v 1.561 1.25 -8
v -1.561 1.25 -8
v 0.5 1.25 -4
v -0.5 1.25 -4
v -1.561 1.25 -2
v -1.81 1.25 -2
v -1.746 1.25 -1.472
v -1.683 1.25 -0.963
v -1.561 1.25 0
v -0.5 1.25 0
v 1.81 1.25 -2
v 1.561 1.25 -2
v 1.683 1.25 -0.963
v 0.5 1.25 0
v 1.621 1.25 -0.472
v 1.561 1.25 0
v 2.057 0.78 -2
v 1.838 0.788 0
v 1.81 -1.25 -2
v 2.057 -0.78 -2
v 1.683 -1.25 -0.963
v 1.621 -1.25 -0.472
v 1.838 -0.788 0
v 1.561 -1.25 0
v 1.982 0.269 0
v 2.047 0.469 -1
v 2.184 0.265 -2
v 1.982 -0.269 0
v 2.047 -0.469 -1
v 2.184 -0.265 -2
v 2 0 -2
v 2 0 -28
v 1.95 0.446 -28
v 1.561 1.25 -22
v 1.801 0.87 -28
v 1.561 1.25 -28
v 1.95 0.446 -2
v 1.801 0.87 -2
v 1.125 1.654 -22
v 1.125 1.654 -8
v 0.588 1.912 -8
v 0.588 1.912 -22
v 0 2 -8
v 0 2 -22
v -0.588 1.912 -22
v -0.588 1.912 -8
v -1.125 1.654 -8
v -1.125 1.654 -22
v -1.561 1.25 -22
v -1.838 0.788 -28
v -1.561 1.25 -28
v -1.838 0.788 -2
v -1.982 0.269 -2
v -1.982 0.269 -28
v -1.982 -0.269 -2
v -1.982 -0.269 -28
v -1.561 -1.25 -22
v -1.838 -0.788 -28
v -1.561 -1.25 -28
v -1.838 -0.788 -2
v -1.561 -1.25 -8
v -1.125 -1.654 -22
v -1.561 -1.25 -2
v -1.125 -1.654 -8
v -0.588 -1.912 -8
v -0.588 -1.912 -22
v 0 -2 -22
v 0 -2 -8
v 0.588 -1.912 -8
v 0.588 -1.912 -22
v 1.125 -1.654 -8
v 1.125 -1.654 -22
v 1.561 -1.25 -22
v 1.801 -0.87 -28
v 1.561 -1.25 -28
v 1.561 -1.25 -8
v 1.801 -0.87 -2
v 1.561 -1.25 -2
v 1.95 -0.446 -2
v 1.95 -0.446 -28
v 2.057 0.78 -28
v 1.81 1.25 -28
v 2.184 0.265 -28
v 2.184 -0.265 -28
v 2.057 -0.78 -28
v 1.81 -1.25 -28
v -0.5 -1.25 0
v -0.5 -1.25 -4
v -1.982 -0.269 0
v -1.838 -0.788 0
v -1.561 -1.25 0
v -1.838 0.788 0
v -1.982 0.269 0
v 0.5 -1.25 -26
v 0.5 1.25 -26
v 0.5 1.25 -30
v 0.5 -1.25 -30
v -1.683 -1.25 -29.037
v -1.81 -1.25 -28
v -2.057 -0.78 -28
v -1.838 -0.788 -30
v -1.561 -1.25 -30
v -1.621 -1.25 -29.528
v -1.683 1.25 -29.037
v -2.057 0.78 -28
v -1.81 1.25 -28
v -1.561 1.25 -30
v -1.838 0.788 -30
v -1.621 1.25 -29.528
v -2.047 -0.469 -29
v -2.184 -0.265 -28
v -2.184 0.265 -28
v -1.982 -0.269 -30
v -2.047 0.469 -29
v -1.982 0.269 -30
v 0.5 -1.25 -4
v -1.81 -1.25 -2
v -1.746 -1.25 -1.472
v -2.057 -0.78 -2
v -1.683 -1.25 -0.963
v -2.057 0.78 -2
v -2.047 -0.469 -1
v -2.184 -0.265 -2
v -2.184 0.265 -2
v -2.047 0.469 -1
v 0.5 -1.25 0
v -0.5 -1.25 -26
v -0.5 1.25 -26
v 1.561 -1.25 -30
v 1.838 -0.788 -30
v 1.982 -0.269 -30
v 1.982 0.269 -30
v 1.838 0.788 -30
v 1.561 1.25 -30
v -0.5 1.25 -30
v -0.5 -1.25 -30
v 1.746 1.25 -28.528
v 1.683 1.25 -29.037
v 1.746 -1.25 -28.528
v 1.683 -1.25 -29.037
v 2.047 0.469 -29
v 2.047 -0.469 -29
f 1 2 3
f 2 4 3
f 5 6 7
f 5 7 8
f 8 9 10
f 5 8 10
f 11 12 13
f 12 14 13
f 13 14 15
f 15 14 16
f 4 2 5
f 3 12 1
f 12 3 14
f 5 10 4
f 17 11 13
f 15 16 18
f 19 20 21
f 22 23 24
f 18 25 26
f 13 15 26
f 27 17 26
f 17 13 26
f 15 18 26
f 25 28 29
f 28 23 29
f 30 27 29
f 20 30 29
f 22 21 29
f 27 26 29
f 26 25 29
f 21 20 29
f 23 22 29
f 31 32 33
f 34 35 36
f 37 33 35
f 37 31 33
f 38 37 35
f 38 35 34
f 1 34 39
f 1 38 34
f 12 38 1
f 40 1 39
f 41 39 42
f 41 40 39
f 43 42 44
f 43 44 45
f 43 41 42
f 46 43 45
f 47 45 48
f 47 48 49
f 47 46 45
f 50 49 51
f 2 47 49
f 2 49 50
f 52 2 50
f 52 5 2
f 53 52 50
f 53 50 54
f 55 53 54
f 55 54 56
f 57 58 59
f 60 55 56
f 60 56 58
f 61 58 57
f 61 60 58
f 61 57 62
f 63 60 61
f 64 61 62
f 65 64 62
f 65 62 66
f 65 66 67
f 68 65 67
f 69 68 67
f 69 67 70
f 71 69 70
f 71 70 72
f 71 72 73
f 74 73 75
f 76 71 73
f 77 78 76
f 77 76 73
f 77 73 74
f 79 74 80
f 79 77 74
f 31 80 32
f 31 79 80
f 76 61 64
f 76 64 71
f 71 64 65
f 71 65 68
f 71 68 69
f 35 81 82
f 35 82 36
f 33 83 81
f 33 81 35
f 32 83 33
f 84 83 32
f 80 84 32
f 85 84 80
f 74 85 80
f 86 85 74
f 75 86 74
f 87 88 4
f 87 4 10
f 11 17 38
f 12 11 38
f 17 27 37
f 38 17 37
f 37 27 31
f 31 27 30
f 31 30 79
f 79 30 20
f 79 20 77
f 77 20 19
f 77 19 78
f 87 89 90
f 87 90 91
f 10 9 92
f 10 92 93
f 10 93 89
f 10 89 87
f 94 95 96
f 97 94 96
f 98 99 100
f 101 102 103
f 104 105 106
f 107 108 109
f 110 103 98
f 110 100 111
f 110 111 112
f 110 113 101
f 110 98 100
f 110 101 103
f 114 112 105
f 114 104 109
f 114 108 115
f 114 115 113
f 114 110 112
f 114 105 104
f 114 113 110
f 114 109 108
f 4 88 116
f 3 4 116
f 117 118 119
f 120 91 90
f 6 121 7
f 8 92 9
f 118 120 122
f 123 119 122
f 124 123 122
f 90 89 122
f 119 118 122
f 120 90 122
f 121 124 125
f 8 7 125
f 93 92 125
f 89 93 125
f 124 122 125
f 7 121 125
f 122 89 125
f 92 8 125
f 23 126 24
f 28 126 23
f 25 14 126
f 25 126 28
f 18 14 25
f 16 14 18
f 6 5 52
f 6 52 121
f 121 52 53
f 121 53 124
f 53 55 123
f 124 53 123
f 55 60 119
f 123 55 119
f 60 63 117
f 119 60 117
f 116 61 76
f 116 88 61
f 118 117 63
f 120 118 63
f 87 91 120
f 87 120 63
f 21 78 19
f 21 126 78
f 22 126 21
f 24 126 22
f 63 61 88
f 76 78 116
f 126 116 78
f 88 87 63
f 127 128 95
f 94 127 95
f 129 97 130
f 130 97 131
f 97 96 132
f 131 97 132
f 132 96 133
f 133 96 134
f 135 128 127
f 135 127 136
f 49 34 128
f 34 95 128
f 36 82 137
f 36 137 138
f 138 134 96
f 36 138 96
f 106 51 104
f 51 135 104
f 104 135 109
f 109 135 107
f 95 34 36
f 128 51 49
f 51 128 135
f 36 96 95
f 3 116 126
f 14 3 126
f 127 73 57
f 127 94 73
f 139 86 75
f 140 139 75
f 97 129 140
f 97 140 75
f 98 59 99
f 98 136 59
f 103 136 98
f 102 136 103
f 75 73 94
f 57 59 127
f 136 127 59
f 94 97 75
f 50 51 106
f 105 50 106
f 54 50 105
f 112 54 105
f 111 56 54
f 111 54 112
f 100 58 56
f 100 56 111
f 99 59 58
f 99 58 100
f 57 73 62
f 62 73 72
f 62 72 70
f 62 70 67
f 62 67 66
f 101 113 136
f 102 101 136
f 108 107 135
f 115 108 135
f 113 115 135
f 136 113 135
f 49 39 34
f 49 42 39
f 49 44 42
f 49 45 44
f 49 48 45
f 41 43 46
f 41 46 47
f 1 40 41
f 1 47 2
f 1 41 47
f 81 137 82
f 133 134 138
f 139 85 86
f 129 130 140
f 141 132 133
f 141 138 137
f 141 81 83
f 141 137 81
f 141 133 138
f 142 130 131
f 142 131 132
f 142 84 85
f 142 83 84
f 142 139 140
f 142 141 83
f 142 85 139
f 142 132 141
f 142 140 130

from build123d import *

# Parameters (mm, degrees)
SKETCH_1_R          = 2
EXTRUDE_1_DEPTH     = 30
SKETCH_3_W          = 4.2
SKETCH_3_H          = 1
CUT_EXTRUDE_1_DEPTH = 8
CUT_EXTRUDE_2_REACH = 32.256
SKETCH_4_W          = 1
SKETCH_4_H          = 4
SKETCH_6_W          = 4.2
SKETCH_6_H          = 1
CUT_EXTRUDE_3_DEPTH = 8
SKETCH_7_W          = 1
SKETCH_7_H          = 4
CUT_EXTRUDE_4_DEPTH = 31.255619313


with BuildPart() as part:
    # 草图1 → 凸台-拉伸1 (new body)
    with BuildSketch(Plane.XY):
        Circle(SKETCH_1_R)
    extrude(amount=-EXTRUDE_1_DEPTH)

    # 草图2 → 旋转1 (revolve)
    with BuildSketch(Plane(origin=(0, 0, 0), x_dir=(1, 0, 0), z_dir=(0, 1, 0))):
        Polygon((0, 0), (0, 2), (2.2, 2), (2, 0), align=None)
    revolve(axis=Axis((0, 0, 0), (0, 0, -1)))

    # 草图3 → 切除-拉伸1 (cut)
    with BuildSketch(Plane.XY):
        with Locations((0, 1.75)):
            Rectangle(SKETCH_3_W, SKETCH_3_H)
        with Locations((0, -1.75)):
            Rectangle(SKETCH_3_W, SKETCH_3_H)
    extrude(amount=-CUT_EXTRUDE_1_DEPTH, mode=Mode.SUBTRACT)

    # 草图4 → 切除-拉伸2 (cut, up to next)
    with BuildSketch(Plane.XZ.offset(1.25), mode=Mode.PRIVATE) as cut_extrude_2_sk1:
        with Locations((0, -2)):
            Rectangle(SKETCH_4_W, SKETCH_4_H)
    cut_extrude_2_tool1 = extrude(cut_extrude_2_sk1.sketch, amount=-CUT_EXTRUDE_2_REACH, mode=Mode.PRIVATE) & part.part
    add(cut_extrude_2_tool1.solids().sort_by_distance((0, -1.25, -2))[0], mode=Mode.SUBTRACT)

    # 草图5 → 旋转2 (revolve)
    with BuildSketch(Plane(origin=(0, 0, 0), x_dir=(1, 0, 0), z_dir=(0, 1, 0))):
        Polygon((0, 30), (0, 28), (2.2, 28), (2, 30), align=None)
    revolve(axis=Axis((0, 0, -58.137689197), (0, 0, -1)))

    # 草图6 → 切除-拉伸3 (cut)
    with BuildSketch(Plane(origin=(0, 0, -30), x_dir=(-1, 0, 0), z_dir=(0, 0, -1))):
        with Locations((0, 1.75)):
            Rectangle(SKETCH_6_W, SKETCH_6_H)
        with Locations((0, -1.75)):
            Rectangle(SKETCH_6_W, SKETCH_6_H)
    extrude(amount=-CUT_EXTRUDE_3_DEPTH, mode=Mode.SUBTRACT)

    # 草图7 → 切除-拉伸4 (cut, through all)
    with BuildSketch(Plane(origin=(0, 1.25, 0), x_dir=(1, 0, 0), z_dir=(0, 1, 0))):
        with Locations((0, 28)):
            Rectangle(SKETCH_7_W, SKETCH_7_H)
    extrude(amount=-CUT_EXTRUDE_4_DEPTH, mode=Mode.SUBTRACT)


solid = part.part
